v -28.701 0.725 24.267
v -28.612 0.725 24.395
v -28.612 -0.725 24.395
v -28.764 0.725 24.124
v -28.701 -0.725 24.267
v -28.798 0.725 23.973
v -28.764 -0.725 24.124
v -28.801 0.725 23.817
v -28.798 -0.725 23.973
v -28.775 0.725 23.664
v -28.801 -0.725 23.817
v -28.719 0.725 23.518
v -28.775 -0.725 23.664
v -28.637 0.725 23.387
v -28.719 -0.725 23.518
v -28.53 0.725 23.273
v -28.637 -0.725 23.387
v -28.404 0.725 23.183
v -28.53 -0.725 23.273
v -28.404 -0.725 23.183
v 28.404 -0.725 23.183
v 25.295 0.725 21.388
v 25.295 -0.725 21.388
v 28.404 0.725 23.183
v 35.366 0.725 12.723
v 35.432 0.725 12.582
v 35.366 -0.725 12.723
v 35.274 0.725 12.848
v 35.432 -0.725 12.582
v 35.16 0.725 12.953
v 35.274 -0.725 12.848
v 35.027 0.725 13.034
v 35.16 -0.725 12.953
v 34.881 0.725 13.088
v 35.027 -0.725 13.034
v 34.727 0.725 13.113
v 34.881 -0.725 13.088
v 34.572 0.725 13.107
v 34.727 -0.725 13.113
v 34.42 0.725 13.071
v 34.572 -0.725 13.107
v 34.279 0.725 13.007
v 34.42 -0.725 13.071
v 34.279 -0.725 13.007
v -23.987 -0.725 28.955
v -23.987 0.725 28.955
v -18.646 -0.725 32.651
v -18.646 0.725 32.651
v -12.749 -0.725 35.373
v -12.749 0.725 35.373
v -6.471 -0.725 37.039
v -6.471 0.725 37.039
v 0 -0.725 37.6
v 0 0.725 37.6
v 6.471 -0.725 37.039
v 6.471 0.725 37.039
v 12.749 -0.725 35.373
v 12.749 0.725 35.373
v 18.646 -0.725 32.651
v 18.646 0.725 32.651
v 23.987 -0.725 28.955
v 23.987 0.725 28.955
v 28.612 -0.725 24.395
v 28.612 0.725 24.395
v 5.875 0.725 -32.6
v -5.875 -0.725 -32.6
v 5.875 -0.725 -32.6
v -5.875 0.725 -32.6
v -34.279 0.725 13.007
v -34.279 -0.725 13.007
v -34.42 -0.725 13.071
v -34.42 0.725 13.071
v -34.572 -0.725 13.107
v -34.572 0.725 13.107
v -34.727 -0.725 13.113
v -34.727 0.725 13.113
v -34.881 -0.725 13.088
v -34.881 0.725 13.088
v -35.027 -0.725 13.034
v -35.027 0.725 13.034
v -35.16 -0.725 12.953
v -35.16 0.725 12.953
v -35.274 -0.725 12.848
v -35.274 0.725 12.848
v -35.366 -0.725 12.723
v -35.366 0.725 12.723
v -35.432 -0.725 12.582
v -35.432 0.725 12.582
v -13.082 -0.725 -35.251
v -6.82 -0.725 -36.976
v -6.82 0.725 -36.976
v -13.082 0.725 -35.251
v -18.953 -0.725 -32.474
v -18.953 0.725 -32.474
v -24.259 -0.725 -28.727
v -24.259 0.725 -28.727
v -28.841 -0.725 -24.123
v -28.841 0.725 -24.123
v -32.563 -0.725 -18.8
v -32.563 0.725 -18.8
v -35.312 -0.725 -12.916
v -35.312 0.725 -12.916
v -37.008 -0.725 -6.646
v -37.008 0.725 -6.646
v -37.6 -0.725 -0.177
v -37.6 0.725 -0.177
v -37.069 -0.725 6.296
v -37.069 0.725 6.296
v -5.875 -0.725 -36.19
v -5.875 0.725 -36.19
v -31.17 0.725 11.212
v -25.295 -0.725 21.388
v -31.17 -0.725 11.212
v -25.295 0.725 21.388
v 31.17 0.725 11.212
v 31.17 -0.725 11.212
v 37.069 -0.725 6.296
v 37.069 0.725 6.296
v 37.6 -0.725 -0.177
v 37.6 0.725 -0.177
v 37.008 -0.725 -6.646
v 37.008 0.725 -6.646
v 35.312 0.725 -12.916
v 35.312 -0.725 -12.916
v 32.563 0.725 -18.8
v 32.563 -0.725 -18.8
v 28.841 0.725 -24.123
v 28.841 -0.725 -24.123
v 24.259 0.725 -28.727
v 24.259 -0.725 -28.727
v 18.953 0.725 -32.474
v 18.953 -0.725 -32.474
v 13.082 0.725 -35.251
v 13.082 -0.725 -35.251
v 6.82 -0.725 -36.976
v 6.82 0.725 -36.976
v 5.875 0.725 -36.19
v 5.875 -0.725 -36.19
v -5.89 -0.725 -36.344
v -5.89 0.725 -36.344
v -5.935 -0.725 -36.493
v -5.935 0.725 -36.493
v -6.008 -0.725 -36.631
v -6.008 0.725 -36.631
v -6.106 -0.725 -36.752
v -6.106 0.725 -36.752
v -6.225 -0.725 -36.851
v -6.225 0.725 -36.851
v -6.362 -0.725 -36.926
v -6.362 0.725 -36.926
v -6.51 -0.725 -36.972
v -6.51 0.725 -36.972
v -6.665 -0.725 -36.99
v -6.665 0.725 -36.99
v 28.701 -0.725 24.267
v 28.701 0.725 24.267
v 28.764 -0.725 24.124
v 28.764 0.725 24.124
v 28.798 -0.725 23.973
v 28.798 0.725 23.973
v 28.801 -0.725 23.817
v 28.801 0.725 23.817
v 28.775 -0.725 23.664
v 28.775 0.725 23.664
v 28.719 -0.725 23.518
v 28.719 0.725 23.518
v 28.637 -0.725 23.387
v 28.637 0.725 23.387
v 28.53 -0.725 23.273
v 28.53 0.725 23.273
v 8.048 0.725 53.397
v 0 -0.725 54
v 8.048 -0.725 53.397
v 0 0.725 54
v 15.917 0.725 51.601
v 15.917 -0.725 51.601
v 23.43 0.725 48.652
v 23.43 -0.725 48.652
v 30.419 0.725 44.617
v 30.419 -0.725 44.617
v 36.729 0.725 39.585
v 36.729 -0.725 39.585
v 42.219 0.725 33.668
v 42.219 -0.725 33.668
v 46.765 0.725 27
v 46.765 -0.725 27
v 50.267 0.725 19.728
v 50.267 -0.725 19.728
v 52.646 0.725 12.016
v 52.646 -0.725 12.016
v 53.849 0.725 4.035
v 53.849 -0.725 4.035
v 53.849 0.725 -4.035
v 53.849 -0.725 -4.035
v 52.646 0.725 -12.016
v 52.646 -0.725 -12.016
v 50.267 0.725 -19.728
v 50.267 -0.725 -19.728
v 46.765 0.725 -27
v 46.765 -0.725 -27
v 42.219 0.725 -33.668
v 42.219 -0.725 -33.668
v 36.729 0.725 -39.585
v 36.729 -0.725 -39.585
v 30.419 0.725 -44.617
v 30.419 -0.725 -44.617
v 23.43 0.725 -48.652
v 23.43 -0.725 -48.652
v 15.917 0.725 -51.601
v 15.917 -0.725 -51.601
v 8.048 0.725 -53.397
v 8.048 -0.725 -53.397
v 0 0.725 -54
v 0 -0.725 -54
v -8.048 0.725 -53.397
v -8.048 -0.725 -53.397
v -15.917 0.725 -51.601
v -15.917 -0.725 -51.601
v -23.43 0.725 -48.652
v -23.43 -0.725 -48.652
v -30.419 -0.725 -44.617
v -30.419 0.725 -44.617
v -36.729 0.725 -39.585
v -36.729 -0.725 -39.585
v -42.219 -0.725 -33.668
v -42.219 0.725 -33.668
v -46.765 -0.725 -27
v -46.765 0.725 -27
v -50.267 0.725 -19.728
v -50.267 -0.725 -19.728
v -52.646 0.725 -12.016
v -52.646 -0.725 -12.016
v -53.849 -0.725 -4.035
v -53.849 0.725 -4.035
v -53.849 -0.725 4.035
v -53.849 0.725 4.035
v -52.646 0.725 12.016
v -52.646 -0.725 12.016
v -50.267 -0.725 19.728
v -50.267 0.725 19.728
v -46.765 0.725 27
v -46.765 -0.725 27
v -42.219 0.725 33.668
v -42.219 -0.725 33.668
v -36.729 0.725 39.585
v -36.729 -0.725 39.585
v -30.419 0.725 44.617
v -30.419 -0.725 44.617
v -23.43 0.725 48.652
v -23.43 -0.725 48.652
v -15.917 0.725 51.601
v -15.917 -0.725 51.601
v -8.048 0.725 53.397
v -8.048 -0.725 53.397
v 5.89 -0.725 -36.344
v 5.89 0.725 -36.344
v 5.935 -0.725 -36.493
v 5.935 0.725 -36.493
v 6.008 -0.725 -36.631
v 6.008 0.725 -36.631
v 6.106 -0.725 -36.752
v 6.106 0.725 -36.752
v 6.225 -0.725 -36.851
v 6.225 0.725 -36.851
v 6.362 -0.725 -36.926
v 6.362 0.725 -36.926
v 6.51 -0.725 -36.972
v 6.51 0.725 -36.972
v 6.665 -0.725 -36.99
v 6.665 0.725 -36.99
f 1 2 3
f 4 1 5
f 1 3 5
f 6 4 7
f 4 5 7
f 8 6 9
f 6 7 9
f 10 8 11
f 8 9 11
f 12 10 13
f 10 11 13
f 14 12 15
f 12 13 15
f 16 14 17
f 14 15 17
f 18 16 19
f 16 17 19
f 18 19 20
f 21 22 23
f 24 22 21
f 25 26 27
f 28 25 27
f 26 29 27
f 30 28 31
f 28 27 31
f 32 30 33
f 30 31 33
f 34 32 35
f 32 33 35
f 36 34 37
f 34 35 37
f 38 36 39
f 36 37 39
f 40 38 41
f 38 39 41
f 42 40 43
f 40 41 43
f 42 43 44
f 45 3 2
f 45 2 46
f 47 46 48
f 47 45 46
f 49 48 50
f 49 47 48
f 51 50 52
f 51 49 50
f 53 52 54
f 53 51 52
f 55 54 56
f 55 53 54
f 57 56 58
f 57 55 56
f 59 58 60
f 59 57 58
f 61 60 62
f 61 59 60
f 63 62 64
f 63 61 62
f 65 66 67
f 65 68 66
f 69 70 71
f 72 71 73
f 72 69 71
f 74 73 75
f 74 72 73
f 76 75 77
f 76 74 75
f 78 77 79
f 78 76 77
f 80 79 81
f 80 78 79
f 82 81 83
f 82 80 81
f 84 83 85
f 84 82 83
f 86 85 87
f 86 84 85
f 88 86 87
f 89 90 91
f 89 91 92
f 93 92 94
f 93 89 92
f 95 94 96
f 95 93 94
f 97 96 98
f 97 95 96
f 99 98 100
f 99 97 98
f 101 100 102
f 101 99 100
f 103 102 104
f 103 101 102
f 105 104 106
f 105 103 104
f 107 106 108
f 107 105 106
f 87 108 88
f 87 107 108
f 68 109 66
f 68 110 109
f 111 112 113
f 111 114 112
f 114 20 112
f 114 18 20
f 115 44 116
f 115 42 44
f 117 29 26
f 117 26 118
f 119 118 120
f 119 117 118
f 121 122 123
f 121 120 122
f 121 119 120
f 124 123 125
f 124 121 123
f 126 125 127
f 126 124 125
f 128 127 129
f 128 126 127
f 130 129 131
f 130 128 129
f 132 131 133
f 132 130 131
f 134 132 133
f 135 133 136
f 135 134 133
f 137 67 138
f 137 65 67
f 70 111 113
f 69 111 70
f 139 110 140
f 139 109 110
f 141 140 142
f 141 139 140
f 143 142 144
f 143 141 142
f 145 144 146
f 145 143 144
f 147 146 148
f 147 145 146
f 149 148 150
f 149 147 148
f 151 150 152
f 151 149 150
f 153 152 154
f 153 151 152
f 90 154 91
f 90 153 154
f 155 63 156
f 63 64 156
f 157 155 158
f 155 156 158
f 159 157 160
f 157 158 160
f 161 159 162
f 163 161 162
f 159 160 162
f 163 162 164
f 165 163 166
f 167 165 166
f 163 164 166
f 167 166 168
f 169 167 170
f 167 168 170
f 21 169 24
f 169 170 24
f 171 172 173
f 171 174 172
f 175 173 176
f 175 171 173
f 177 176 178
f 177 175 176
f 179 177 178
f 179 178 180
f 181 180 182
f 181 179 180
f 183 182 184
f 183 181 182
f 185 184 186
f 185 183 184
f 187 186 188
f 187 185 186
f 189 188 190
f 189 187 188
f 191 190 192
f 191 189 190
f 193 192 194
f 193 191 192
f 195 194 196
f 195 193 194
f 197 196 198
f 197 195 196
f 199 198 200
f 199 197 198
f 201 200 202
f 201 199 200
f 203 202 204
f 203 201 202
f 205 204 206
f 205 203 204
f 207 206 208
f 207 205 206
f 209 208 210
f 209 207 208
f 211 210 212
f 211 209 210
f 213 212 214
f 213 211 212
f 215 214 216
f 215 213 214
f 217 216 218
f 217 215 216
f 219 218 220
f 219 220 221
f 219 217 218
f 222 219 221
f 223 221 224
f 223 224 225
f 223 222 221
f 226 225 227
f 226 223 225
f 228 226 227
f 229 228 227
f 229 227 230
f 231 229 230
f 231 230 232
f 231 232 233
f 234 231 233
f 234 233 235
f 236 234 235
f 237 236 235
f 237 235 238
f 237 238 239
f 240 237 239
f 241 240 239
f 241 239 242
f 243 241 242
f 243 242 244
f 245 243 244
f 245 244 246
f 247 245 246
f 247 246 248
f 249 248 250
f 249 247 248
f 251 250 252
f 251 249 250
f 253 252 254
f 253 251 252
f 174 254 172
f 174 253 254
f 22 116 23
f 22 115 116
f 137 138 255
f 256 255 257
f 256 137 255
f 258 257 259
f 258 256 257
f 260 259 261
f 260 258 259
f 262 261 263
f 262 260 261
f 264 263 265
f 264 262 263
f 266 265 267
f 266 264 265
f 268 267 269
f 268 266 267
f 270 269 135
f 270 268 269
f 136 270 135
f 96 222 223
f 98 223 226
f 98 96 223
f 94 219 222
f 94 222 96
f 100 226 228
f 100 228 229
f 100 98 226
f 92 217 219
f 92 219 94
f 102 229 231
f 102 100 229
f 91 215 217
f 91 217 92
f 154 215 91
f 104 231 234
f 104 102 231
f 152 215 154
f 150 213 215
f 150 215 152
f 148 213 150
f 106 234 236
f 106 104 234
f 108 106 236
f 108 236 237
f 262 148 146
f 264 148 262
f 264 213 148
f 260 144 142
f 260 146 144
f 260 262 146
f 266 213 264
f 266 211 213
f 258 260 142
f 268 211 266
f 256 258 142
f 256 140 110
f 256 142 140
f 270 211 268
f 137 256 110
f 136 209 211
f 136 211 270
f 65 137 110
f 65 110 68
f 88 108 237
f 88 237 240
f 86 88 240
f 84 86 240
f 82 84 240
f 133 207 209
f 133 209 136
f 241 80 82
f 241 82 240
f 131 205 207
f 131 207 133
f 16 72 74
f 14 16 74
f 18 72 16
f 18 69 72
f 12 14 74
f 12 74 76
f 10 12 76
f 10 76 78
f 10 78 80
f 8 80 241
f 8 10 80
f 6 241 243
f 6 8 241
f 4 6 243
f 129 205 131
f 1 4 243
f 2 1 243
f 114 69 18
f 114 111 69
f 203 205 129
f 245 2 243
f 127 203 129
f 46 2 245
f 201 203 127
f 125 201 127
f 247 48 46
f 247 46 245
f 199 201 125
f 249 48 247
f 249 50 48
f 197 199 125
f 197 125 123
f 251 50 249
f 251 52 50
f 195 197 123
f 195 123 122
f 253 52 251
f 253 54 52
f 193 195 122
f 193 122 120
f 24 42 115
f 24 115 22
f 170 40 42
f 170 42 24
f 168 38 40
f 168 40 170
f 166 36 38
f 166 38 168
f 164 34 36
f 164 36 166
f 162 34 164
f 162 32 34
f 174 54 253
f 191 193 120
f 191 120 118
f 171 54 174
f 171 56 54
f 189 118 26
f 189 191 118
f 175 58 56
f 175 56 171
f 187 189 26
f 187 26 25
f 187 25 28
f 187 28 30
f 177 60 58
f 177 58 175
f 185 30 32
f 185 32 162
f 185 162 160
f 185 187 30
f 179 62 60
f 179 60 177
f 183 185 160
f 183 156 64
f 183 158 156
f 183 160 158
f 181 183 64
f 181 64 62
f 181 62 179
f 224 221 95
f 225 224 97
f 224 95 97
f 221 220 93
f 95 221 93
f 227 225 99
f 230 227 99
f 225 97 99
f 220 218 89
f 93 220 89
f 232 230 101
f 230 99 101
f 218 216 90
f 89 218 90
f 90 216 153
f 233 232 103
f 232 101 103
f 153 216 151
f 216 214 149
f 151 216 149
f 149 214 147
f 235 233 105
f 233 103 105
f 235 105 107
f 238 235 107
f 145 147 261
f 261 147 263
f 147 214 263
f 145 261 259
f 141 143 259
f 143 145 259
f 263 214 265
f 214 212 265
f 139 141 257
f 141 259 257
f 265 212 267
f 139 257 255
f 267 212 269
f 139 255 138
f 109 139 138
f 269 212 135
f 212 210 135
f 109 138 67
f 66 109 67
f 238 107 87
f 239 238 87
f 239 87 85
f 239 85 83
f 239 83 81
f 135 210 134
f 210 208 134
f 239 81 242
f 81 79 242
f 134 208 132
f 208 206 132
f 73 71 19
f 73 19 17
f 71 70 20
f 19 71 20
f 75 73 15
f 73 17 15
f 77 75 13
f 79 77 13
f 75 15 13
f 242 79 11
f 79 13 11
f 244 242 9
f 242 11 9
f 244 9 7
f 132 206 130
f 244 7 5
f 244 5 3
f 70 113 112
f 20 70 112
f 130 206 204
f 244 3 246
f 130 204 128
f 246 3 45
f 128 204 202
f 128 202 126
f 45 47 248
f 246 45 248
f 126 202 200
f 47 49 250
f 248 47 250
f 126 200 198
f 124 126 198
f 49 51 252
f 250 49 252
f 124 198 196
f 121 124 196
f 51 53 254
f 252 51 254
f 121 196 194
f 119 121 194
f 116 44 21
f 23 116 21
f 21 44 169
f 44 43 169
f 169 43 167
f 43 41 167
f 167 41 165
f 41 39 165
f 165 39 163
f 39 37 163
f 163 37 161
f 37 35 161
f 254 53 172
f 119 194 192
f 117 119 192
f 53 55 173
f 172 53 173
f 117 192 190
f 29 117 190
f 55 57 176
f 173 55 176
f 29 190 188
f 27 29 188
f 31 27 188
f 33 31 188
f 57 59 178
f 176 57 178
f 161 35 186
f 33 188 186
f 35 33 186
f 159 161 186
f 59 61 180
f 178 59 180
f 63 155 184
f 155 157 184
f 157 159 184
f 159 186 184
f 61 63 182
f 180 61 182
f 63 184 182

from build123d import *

# Parameters (mm, degrees)
SKETCH1_R                = 54
SKETCH1_R_2              = 37.6
BOSS_EXTRUDE1_DEPTH      = 0.725
BOSS_EXTRUDE2_DEPTH      = 0.725
FILLET1_R                = 0.8
CIRPATTERN1_COUNT        = 3
FILLET1_OF_CIRPATTERN1_R = 0.8


with BuildPart() as part:
    # Sketch1 → Boss-Extrude1 (new, symmetric)
    with BuildSketch(Plane(origin=(0, 0, 0), x_dir=(1, 0, 0), z_dir=(0, 1, 0))):
        with Locations(Location((0, 0, 0), (0, 0, 270))):
            Circle(SKETCH1_R)
        with Locations(Location((0, 0, 0), (0, 0, 270))):
            Circle(SKETCH1_R_2, mode=Mode.SUBTRACT)
    extrude(amount=BOSS_EXTRUDE1_DEPTH, both=True)

    # Sketch2 → Boss-Extrude2 (add, symmetric)
    with BuildSketch(Plane(origin=(0, 0, 0), x_dir=(1, 0, 0), z_dir=(0, 1, 0))):
        with BuildLine():
            Line((-5.875, 32.6), (5.875, 32.6))
            Line((5.875, 32.6), (5.875, 37.138179479))
            ThreePointArc((5.875, 37.138179479), (0, 37.6), (-5.875, 37.138179479))
            Line((-5.875, 37.138179479), (-5.875, 32.6))
        make_face()
    boss_extrude2 = extrude(amount=BOSS_EXTRUDE2_DEPTH, both=True)

    # Fillet1
    fillet1_edges = [part.edges().sort_by_distance(p)[0] for p in [
        (-5.875, 0, -37.138179479),
        (5.875, 0, -37.138179479),
    ]]
    fillet(fillet1_edges, radius=FILLET1_R)

    # CirPattern1: Boss-Extrude2 ×3 about axis
    cirpattern1_axis = Axis((0, 0, 0), (0, 1, 0))
    for i in range(1, CIRPATTERN1_COUNT):
        add(boss_extrude2.rotate(cirpattern1_axis, i * 360 / CIRPATTERN1_COUNT))

    # Fillet1 of CirPattern1
    fillet1_of_cirpattern1_edges = [part.edges().sort_by_distance(p)[0] for p in [
        (-29.225106879, 0, 23.656988987),
        (-35.100106879, 0, 13.481190492),
        (35.100106879, 0, 13.481190492),
        (29.225106879, 0, 23.656988987),
    ]]
    fillet(fillet1_of_cirpattern1_edges, radius=FILLET1_OF_CIRPATTERN1_R)


solid = part.part
